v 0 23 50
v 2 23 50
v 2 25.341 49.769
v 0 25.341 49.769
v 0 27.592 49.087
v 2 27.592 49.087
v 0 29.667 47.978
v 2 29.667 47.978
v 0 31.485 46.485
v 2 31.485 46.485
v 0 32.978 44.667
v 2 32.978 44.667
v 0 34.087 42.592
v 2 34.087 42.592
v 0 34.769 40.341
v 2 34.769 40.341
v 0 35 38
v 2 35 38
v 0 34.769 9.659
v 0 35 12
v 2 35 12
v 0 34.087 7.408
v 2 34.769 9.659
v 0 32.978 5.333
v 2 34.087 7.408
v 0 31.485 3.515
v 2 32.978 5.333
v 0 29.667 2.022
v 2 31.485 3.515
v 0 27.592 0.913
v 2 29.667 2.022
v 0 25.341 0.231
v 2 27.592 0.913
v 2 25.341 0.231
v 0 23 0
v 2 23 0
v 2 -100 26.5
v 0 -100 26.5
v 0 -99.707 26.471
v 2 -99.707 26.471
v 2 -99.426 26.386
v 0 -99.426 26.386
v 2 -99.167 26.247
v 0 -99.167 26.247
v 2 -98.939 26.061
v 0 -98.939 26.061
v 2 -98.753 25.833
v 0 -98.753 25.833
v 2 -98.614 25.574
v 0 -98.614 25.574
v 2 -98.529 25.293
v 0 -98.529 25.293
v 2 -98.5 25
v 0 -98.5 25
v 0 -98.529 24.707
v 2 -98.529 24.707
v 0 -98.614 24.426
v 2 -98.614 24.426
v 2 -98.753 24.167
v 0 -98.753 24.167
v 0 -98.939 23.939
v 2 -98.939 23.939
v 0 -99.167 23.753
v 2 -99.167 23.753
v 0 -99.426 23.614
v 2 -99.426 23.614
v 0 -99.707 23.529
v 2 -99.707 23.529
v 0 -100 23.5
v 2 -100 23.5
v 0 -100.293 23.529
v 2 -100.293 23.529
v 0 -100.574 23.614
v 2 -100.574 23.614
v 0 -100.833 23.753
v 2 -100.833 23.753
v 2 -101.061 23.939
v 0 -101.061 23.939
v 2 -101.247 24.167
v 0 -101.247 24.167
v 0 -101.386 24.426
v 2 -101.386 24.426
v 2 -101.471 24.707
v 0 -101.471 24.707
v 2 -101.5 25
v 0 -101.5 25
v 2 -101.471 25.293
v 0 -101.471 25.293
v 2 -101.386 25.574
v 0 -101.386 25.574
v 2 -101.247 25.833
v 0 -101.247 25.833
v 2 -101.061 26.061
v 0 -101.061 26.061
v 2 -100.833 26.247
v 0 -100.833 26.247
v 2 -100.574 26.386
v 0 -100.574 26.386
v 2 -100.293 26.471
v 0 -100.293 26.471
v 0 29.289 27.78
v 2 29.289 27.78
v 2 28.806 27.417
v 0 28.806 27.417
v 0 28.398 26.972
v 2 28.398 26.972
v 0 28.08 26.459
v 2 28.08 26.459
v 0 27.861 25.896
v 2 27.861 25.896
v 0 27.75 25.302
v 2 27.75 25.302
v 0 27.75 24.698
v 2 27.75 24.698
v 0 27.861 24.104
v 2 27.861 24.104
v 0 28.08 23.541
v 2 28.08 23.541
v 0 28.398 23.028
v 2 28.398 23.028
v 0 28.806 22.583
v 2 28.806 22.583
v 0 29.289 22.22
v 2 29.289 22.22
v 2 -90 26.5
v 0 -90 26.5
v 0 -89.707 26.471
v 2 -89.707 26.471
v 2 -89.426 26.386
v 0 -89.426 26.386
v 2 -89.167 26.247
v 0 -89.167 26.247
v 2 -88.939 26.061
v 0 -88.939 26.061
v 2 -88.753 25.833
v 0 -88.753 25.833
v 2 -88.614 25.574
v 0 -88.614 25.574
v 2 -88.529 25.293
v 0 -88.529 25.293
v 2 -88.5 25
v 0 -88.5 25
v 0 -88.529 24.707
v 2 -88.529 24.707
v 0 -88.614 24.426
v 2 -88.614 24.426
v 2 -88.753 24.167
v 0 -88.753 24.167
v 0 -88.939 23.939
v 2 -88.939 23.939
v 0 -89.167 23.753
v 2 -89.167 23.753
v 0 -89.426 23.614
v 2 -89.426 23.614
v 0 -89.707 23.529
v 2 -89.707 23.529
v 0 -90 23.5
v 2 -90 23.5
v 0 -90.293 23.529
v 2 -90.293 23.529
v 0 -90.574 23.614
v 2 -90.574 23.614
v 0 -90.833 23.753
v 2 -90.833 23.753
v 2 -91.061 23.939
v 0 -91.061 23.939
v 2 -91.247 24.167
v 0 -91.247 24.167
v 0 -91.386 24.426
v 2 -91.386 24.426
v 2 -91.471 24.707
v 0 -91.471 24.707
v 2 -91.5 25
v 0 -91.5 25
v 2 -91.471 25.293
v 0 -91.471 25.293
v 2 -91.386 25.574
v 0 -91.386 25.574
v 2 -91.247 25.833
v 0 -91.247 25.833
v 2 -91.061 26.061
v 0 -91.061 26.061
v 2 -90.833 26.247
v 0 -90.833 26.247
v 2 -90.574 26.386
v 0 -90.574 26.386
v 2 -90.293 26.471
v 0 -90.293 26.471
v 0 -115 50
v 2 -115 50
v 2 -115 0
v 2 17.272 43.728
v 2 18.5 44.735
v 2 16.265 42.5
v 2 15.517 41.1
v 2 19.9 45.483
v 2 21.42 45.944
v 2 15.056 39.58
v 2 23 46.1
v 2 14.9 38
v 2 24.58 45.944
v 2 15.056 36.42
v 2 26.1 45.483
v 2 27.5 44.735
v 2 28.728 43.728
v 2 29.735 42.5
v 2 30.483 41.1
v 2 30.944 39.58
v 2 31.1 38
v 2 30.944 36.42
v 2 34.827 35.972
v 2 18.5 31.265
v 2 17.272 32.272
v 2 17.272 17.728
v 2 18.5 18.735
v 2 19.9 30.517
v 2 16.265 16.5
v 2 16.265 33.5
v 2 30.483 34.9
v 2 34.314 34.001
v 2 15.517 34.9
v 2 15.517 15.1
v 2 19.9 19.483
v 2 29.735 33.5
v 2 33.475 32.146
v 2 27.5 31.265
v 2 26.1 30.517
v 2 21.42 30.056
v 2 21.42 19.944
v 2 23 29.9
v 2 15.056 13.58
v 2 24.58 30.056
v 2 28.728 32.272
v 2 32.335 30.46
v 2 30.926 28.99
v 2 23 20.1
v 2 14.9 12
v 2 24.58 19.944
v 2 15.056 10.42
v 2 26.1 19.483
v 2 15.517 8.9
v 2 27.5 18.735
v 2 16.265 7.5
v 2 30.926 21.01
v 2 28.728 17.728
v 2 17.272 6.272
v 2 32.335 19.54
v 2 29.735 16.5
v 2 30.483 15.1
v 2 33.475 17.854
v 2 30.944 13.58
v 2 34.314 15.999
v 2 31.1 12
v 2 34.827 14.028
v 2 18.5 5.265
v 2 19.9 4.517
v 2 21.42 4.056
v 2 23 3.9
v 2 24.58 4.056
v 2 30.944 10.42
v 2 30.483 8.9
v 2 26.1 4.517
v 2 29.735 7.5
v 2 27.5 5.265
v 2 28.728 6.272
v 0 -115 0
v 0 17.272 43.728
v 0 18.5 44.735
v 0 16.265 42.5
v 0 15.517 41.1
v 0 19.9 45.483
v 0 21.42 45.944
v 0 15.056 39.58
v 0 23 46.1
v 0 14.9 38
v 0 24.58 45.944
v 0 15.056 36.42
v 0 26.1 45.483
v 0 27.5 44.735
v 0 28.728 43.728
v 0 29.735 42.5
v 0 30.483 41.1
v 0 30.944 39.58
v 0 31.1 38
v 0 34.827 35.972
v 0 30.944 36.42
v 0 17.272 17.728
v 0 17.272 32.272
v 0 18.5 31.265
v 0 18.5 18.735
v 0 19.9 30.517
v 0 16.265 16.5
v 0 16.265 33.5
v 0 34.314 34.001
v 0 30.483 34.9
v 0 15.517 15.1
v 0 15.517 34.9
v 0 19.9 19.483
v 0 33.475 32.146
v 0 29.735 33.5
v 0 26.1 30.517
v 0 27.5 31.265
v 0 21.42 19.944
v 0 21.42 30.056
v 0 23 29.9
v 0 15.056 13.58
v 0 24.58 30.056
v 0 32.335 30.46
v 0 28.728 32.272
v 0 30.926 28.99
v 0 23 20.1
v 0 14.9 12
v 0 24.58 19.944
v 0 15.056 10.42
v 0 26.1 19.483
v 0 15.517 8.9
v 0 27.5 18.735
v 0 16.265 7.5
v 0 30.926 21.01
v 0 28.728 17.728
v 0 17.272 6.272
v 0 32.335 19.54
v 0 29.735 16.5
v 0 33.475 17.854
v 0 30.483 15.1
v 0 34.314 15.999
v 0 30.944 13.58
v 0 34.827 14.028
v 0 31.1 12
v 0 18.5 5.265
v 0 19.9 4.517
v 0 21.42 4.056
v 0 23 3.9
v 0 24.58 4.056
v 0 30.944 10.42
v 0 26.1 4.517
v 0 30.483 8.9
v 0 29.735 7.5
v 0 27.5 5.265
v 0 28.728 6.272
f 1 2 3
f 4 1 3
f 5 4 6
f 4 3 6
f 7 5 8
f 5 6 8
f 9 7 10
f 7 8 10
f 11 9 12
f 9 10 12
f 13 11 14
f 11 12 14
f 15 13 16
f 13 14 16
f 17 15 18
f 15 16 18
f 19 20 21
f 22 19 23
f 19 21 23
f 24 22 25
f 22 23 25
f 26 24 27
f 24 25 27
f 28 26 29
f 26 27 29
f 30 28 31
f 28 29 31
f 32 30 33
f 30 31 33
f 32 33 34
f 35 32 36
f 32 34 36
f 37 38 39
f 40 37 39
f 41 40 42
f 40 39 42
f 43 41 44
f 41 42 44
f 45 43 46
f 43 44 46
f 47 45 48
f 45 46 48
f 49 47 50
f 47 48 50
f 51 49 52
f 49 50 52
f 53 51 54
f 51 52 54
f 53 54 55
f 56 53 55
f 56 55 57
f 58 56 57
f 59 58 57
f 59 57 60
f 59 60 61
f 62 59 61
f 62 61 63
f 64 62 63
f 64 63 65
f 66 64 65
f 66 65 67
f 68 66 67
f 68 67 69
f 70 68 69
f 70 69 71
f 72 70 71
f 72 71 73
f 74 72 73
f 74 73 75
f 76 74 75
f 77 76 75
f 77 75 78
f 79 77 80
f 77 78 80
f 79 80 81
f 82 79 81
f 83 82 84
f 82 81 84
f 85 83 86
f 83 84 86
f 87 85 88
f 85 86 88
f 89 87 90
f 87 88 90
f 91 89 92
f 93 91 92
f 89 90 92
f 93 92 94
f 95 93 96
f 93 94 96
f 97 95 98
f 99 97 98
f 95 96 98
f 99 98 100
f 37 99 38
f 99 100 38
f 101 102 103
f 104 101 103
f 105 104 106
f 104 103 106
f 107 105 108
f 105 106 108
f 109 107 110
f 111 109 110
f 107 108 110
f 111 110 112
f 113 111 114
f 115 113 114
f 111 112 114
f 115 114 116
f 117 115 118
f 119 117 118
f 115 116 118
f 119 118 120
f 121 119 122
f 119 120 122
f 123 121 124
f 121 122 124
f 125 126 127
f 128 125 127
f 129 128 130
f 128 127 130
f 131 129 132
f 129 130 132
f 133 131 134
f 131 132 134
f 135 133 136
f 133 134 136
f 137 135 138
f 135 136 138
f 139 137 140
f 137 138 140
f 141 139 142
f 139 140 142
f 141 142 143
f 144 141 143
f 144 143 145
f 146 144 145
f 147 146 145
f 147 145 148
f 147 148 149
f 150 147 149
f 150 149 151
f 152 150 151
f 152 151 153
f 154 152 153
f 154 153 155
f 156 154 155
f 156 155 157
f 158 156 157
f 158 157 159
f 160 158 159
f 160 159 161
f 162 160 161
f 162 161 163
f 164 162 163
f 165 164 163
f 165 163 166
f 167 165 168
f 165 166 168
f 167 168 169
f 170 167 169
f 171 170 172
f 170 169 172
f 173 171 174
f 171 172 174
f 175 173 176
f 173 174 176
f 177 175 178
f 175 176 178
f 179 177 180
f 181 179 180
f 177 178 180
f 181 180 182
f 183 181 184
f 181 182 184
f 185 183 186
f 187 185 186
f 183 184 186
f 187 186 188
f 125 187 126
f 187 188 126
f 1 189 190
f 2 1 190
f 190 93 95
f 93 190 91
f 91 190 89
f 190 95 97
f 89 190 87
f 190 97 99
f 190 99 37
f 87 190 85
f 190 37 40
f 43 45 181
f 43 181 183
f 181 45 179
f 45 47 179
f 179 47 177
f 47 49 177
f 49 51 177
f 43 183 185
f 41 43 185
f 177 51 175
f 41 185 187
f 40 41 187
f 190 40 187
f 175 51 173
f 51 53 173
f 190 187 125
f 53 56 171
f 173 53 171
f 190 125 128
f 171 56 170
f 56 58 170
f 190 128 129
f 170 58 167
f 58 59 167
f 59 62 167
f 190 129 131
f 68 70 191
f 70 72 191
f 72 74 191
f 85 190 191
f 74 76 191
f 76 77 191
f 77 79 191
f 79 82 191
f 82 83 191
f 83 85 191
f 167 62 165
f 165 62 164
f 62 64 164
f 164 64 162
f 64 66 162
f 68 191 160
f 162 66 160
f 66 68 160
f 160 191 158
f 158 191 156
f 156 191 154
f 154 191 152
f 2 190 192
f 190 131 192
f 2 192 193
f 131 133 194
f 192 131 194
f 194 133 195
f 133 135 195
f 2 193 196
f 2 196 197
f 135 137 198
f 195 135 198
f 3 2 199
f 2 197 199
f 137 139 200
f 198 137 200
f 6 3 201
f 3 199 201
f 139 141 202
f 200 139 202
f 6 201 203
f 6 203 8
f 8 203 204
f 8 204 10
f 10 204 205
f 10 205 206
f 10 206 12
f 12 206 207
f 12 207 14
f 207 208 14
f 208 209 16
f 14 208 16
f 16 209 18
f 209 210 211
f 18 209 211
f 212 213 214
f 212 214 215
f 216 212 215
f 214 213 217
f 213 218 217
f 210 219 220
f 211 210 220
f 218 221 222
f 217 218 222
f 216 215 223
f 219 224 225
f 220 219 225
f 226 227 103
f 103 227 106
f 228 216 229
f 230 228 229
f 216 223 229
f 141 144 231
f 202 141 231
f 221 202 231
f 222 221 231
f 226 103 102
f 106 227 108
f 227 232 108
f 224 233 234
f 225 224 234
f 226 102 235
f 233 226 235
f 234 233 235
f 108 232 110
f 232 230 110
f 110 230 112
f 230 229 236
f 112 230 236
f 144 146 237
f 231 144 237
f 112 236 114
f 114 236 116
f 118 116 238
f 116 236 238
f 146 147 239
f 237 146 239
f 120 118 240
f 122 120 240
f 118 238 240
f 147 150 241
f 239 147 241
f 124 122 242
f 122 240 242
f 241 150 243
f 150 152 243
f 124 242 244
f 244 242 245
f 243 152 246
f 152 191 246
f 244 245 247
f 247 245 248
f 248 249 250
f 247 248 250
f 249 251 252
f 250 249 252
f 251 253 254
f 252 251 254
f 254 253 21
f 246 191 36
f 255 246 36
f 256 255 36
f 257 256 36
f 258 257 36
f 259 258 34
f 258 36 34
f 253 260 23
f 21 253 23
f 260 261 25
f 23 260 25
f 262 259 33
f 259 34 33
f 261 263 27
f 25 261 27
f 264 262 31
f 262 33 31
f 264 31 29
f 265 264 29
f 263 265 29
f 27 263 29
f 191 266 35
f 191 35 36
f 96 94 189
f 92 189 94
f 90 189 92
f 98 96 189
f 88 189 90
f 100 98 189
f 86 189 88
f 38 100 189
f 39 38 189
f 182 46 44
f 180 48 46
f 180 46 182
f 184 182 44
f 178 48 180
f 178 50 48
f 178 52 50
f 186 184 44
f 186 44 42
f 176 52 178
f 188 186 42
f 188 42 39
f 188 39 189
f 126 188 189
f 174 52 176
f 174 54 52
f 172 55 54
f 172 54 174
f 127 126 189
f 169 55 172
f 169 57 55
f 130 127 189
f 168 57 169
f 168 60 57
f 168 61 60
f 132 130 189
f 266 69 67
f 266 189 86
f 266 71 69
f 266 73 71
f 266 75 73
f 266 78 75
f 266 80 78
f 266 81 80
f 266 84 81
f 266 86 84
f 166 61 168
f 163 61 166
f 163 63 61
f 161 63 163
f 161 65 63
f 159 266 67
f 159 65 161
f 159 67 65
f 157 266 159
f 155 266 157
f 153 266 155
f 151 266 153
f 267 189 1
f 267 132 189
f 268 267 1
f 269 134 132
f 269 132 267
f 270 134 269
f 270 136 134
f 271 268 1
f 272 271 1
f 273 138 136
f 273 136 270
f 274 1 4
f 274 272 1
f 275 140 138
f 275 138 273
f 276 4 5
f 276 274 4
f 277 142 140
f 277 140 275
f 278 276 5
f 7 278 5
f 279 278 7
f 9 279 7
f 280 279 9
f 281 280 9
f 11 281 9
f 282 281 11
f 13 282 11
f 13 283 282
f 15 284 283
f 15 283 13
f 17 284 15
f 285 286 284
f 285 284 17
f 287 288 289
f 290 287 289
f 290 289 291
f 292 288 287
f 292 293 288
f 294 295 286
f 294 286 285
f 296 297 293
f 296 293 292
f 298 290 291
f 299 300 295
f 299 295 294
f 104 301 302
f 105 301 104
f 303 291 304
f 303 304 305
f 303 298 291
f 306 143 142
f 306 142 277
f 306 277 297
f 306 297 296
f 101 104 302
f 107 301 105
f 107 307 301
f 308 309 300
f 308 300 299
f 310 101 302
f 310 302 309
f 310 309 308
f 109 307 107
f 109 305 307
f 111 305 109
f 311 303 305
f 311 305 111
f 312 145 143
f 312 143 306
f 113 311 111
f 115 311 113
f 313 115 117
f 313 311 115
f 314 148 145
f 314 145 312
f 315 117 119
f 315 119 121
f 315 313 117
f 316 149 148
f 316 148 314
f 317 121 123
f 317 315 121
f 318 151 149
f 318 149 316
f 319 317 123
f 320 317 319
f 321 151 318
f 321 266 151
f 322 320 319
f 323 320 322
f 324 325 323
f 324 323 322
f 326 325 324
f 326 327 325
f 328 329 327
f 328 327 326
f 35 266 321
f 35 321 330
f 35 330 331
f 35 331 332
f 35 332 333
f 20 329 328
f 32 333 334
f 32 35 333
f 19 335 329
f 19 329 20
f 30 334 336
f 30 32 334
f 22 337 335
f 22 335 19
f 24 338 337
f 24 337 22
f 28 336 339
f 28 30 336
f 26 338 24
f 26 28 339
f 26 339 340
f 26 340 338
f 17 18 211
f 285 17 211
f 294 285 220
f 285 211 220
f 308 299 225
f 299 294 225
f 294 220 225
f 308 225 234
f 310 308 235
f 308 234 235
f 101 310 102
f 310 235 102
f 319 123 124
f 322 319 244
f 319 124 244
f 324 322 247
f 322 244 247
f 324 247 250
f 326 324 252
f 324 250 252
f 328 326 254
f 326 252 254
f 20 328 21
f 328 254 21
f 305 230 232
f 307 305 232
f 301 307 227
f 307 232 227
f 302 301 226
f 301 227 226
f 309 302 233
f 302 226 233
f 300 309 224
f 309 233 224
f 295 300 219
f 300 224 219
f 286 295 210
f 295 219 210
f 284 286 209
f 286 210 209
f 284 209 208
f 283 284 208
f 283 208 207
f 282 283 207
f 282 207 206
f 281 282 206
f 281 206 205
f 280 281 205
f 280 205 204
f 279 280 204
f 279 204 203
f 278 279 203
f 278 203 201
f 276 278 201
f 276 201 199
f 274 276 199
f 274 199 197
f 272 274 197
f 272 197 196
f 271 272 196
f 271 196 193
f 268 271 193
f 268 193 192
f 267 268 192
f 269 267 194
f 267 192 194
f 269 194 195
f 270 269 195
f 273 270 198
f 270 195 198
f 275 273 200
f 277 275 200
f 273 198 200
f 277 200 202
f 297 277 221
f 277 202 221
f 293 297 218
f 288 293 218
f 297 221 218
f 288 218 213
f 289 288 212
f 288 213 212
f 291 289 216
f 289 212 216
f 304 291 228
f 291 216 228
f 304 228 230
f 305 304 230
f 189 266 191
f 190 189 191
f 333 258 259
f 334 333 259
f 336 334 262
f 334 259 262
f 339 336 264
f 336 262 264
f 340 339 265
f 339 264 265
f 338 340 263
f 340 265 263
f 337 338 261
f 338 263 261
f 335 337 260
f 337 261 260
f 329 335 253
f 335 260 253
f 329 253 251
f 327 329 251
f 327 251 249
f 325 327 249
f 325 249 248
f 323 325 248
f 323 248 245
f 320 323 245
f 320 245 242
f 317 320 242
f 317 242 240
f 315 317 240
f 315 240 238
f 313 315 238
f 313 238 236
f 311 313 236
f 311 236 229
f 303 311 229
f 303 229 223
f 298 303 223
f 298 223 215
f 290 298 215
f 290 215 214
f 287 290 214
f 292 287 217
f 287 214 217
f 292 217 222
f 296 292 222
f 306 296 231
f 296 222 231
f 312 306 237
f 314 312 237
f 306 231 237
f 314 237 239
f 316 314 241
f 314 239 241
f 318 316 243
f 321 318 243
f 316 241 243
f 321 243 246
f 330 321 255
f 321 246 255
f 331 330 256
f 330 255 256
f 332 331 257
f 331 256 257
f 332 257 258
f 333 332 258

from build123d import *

# Parameters (mm, degrees)
SKETCH1_W               = 2
SKETCH1_H               = 150
BOSS_EXTRUDE1_DEPTH     = 50
SKETCH3_R               = 8.1
CUT_EXTRUDE2_DEPTH      = 50
SKETCH4_R               = 1.5
CUT_EXTRUDE3_DEPTH      = 1
CUT_EXTRUDE3_DEPTH_BACK = 3


with BuildPart() as part:
    # Sketch1 → Boss-Extrude1 (new body)
    with BuildSketch(Plane.XY):
        with Locations((1, -40)):
            Rectangle(SKETCH1_W, SKETCH1_H)
    extrude(amount=BOSS_EXTRUDE1_DEPTH)

    # Sketch3 → Cut-Extrude2 (cut)
    with BuildSketch(Plane(origin=(2, 0, 0), x_dir=(0, 0, -1), z_dir=(1, 0, 0))):
        with Locations((-12, 23)):
            Circle(SKETCH3_R)
        with Locations((-38, 23)):
            Circle(SKETCH3_R)
        with BuildLine():
            ThreePointArc((-50, 23), (-46.485281374, 31.485281374), (-38, 35))
            Line((-38, 35), (-50, 35))
            Line((-50, 35), (-50, 23))
        make_face()
        with BuildLine():
            ThreePointArc((-22.2198998, 29.289169108), (-17.8536301, 33.475448184), (-12, 35))
            Line((-12, 35), (-38, 35))
            ThreePointArc((-38, 35), (-32.1463699, 33.475448184), (-27.7801002, 29.289169108))
            ThreePointArc((-27.7801002, 29.289169108), (-25, 27.735662478), (-22.2198998, 29.289169108))
        make_face()
        with BuildLine():
            Line((0, 35), (-12, 35))
            ThreePointArc((-12, 35), (-3.514718626, 31.485281374), (0, 23))
            Line((0, 23), (0, 35))
        make_face()
    extrude(amount=-CUT_EXTRUDE2_DEPTH, mode=Mode.SUBTRACT)

    # Sketch4 → Cut-Extrude3 (cut, two sides)
    with BuildSketch(Plane.ZY) as cut_extrude3_sk:
        with Locations((25, -100)):
            Circle(SKETCH4_R)
        with Locations((25, -90)):
            Circle(SKETCH4_R)
    extrude(amount=CUT_EXTRUDE3_DEPTH, mode=Mode.SUBTRACT)
    extrude(cut_extrude3_sk.sketch, amount=-CUT_EXTRUDE3_DEPTH_BACK, mode=Mode.SUBTRACT)


solid = part.part
